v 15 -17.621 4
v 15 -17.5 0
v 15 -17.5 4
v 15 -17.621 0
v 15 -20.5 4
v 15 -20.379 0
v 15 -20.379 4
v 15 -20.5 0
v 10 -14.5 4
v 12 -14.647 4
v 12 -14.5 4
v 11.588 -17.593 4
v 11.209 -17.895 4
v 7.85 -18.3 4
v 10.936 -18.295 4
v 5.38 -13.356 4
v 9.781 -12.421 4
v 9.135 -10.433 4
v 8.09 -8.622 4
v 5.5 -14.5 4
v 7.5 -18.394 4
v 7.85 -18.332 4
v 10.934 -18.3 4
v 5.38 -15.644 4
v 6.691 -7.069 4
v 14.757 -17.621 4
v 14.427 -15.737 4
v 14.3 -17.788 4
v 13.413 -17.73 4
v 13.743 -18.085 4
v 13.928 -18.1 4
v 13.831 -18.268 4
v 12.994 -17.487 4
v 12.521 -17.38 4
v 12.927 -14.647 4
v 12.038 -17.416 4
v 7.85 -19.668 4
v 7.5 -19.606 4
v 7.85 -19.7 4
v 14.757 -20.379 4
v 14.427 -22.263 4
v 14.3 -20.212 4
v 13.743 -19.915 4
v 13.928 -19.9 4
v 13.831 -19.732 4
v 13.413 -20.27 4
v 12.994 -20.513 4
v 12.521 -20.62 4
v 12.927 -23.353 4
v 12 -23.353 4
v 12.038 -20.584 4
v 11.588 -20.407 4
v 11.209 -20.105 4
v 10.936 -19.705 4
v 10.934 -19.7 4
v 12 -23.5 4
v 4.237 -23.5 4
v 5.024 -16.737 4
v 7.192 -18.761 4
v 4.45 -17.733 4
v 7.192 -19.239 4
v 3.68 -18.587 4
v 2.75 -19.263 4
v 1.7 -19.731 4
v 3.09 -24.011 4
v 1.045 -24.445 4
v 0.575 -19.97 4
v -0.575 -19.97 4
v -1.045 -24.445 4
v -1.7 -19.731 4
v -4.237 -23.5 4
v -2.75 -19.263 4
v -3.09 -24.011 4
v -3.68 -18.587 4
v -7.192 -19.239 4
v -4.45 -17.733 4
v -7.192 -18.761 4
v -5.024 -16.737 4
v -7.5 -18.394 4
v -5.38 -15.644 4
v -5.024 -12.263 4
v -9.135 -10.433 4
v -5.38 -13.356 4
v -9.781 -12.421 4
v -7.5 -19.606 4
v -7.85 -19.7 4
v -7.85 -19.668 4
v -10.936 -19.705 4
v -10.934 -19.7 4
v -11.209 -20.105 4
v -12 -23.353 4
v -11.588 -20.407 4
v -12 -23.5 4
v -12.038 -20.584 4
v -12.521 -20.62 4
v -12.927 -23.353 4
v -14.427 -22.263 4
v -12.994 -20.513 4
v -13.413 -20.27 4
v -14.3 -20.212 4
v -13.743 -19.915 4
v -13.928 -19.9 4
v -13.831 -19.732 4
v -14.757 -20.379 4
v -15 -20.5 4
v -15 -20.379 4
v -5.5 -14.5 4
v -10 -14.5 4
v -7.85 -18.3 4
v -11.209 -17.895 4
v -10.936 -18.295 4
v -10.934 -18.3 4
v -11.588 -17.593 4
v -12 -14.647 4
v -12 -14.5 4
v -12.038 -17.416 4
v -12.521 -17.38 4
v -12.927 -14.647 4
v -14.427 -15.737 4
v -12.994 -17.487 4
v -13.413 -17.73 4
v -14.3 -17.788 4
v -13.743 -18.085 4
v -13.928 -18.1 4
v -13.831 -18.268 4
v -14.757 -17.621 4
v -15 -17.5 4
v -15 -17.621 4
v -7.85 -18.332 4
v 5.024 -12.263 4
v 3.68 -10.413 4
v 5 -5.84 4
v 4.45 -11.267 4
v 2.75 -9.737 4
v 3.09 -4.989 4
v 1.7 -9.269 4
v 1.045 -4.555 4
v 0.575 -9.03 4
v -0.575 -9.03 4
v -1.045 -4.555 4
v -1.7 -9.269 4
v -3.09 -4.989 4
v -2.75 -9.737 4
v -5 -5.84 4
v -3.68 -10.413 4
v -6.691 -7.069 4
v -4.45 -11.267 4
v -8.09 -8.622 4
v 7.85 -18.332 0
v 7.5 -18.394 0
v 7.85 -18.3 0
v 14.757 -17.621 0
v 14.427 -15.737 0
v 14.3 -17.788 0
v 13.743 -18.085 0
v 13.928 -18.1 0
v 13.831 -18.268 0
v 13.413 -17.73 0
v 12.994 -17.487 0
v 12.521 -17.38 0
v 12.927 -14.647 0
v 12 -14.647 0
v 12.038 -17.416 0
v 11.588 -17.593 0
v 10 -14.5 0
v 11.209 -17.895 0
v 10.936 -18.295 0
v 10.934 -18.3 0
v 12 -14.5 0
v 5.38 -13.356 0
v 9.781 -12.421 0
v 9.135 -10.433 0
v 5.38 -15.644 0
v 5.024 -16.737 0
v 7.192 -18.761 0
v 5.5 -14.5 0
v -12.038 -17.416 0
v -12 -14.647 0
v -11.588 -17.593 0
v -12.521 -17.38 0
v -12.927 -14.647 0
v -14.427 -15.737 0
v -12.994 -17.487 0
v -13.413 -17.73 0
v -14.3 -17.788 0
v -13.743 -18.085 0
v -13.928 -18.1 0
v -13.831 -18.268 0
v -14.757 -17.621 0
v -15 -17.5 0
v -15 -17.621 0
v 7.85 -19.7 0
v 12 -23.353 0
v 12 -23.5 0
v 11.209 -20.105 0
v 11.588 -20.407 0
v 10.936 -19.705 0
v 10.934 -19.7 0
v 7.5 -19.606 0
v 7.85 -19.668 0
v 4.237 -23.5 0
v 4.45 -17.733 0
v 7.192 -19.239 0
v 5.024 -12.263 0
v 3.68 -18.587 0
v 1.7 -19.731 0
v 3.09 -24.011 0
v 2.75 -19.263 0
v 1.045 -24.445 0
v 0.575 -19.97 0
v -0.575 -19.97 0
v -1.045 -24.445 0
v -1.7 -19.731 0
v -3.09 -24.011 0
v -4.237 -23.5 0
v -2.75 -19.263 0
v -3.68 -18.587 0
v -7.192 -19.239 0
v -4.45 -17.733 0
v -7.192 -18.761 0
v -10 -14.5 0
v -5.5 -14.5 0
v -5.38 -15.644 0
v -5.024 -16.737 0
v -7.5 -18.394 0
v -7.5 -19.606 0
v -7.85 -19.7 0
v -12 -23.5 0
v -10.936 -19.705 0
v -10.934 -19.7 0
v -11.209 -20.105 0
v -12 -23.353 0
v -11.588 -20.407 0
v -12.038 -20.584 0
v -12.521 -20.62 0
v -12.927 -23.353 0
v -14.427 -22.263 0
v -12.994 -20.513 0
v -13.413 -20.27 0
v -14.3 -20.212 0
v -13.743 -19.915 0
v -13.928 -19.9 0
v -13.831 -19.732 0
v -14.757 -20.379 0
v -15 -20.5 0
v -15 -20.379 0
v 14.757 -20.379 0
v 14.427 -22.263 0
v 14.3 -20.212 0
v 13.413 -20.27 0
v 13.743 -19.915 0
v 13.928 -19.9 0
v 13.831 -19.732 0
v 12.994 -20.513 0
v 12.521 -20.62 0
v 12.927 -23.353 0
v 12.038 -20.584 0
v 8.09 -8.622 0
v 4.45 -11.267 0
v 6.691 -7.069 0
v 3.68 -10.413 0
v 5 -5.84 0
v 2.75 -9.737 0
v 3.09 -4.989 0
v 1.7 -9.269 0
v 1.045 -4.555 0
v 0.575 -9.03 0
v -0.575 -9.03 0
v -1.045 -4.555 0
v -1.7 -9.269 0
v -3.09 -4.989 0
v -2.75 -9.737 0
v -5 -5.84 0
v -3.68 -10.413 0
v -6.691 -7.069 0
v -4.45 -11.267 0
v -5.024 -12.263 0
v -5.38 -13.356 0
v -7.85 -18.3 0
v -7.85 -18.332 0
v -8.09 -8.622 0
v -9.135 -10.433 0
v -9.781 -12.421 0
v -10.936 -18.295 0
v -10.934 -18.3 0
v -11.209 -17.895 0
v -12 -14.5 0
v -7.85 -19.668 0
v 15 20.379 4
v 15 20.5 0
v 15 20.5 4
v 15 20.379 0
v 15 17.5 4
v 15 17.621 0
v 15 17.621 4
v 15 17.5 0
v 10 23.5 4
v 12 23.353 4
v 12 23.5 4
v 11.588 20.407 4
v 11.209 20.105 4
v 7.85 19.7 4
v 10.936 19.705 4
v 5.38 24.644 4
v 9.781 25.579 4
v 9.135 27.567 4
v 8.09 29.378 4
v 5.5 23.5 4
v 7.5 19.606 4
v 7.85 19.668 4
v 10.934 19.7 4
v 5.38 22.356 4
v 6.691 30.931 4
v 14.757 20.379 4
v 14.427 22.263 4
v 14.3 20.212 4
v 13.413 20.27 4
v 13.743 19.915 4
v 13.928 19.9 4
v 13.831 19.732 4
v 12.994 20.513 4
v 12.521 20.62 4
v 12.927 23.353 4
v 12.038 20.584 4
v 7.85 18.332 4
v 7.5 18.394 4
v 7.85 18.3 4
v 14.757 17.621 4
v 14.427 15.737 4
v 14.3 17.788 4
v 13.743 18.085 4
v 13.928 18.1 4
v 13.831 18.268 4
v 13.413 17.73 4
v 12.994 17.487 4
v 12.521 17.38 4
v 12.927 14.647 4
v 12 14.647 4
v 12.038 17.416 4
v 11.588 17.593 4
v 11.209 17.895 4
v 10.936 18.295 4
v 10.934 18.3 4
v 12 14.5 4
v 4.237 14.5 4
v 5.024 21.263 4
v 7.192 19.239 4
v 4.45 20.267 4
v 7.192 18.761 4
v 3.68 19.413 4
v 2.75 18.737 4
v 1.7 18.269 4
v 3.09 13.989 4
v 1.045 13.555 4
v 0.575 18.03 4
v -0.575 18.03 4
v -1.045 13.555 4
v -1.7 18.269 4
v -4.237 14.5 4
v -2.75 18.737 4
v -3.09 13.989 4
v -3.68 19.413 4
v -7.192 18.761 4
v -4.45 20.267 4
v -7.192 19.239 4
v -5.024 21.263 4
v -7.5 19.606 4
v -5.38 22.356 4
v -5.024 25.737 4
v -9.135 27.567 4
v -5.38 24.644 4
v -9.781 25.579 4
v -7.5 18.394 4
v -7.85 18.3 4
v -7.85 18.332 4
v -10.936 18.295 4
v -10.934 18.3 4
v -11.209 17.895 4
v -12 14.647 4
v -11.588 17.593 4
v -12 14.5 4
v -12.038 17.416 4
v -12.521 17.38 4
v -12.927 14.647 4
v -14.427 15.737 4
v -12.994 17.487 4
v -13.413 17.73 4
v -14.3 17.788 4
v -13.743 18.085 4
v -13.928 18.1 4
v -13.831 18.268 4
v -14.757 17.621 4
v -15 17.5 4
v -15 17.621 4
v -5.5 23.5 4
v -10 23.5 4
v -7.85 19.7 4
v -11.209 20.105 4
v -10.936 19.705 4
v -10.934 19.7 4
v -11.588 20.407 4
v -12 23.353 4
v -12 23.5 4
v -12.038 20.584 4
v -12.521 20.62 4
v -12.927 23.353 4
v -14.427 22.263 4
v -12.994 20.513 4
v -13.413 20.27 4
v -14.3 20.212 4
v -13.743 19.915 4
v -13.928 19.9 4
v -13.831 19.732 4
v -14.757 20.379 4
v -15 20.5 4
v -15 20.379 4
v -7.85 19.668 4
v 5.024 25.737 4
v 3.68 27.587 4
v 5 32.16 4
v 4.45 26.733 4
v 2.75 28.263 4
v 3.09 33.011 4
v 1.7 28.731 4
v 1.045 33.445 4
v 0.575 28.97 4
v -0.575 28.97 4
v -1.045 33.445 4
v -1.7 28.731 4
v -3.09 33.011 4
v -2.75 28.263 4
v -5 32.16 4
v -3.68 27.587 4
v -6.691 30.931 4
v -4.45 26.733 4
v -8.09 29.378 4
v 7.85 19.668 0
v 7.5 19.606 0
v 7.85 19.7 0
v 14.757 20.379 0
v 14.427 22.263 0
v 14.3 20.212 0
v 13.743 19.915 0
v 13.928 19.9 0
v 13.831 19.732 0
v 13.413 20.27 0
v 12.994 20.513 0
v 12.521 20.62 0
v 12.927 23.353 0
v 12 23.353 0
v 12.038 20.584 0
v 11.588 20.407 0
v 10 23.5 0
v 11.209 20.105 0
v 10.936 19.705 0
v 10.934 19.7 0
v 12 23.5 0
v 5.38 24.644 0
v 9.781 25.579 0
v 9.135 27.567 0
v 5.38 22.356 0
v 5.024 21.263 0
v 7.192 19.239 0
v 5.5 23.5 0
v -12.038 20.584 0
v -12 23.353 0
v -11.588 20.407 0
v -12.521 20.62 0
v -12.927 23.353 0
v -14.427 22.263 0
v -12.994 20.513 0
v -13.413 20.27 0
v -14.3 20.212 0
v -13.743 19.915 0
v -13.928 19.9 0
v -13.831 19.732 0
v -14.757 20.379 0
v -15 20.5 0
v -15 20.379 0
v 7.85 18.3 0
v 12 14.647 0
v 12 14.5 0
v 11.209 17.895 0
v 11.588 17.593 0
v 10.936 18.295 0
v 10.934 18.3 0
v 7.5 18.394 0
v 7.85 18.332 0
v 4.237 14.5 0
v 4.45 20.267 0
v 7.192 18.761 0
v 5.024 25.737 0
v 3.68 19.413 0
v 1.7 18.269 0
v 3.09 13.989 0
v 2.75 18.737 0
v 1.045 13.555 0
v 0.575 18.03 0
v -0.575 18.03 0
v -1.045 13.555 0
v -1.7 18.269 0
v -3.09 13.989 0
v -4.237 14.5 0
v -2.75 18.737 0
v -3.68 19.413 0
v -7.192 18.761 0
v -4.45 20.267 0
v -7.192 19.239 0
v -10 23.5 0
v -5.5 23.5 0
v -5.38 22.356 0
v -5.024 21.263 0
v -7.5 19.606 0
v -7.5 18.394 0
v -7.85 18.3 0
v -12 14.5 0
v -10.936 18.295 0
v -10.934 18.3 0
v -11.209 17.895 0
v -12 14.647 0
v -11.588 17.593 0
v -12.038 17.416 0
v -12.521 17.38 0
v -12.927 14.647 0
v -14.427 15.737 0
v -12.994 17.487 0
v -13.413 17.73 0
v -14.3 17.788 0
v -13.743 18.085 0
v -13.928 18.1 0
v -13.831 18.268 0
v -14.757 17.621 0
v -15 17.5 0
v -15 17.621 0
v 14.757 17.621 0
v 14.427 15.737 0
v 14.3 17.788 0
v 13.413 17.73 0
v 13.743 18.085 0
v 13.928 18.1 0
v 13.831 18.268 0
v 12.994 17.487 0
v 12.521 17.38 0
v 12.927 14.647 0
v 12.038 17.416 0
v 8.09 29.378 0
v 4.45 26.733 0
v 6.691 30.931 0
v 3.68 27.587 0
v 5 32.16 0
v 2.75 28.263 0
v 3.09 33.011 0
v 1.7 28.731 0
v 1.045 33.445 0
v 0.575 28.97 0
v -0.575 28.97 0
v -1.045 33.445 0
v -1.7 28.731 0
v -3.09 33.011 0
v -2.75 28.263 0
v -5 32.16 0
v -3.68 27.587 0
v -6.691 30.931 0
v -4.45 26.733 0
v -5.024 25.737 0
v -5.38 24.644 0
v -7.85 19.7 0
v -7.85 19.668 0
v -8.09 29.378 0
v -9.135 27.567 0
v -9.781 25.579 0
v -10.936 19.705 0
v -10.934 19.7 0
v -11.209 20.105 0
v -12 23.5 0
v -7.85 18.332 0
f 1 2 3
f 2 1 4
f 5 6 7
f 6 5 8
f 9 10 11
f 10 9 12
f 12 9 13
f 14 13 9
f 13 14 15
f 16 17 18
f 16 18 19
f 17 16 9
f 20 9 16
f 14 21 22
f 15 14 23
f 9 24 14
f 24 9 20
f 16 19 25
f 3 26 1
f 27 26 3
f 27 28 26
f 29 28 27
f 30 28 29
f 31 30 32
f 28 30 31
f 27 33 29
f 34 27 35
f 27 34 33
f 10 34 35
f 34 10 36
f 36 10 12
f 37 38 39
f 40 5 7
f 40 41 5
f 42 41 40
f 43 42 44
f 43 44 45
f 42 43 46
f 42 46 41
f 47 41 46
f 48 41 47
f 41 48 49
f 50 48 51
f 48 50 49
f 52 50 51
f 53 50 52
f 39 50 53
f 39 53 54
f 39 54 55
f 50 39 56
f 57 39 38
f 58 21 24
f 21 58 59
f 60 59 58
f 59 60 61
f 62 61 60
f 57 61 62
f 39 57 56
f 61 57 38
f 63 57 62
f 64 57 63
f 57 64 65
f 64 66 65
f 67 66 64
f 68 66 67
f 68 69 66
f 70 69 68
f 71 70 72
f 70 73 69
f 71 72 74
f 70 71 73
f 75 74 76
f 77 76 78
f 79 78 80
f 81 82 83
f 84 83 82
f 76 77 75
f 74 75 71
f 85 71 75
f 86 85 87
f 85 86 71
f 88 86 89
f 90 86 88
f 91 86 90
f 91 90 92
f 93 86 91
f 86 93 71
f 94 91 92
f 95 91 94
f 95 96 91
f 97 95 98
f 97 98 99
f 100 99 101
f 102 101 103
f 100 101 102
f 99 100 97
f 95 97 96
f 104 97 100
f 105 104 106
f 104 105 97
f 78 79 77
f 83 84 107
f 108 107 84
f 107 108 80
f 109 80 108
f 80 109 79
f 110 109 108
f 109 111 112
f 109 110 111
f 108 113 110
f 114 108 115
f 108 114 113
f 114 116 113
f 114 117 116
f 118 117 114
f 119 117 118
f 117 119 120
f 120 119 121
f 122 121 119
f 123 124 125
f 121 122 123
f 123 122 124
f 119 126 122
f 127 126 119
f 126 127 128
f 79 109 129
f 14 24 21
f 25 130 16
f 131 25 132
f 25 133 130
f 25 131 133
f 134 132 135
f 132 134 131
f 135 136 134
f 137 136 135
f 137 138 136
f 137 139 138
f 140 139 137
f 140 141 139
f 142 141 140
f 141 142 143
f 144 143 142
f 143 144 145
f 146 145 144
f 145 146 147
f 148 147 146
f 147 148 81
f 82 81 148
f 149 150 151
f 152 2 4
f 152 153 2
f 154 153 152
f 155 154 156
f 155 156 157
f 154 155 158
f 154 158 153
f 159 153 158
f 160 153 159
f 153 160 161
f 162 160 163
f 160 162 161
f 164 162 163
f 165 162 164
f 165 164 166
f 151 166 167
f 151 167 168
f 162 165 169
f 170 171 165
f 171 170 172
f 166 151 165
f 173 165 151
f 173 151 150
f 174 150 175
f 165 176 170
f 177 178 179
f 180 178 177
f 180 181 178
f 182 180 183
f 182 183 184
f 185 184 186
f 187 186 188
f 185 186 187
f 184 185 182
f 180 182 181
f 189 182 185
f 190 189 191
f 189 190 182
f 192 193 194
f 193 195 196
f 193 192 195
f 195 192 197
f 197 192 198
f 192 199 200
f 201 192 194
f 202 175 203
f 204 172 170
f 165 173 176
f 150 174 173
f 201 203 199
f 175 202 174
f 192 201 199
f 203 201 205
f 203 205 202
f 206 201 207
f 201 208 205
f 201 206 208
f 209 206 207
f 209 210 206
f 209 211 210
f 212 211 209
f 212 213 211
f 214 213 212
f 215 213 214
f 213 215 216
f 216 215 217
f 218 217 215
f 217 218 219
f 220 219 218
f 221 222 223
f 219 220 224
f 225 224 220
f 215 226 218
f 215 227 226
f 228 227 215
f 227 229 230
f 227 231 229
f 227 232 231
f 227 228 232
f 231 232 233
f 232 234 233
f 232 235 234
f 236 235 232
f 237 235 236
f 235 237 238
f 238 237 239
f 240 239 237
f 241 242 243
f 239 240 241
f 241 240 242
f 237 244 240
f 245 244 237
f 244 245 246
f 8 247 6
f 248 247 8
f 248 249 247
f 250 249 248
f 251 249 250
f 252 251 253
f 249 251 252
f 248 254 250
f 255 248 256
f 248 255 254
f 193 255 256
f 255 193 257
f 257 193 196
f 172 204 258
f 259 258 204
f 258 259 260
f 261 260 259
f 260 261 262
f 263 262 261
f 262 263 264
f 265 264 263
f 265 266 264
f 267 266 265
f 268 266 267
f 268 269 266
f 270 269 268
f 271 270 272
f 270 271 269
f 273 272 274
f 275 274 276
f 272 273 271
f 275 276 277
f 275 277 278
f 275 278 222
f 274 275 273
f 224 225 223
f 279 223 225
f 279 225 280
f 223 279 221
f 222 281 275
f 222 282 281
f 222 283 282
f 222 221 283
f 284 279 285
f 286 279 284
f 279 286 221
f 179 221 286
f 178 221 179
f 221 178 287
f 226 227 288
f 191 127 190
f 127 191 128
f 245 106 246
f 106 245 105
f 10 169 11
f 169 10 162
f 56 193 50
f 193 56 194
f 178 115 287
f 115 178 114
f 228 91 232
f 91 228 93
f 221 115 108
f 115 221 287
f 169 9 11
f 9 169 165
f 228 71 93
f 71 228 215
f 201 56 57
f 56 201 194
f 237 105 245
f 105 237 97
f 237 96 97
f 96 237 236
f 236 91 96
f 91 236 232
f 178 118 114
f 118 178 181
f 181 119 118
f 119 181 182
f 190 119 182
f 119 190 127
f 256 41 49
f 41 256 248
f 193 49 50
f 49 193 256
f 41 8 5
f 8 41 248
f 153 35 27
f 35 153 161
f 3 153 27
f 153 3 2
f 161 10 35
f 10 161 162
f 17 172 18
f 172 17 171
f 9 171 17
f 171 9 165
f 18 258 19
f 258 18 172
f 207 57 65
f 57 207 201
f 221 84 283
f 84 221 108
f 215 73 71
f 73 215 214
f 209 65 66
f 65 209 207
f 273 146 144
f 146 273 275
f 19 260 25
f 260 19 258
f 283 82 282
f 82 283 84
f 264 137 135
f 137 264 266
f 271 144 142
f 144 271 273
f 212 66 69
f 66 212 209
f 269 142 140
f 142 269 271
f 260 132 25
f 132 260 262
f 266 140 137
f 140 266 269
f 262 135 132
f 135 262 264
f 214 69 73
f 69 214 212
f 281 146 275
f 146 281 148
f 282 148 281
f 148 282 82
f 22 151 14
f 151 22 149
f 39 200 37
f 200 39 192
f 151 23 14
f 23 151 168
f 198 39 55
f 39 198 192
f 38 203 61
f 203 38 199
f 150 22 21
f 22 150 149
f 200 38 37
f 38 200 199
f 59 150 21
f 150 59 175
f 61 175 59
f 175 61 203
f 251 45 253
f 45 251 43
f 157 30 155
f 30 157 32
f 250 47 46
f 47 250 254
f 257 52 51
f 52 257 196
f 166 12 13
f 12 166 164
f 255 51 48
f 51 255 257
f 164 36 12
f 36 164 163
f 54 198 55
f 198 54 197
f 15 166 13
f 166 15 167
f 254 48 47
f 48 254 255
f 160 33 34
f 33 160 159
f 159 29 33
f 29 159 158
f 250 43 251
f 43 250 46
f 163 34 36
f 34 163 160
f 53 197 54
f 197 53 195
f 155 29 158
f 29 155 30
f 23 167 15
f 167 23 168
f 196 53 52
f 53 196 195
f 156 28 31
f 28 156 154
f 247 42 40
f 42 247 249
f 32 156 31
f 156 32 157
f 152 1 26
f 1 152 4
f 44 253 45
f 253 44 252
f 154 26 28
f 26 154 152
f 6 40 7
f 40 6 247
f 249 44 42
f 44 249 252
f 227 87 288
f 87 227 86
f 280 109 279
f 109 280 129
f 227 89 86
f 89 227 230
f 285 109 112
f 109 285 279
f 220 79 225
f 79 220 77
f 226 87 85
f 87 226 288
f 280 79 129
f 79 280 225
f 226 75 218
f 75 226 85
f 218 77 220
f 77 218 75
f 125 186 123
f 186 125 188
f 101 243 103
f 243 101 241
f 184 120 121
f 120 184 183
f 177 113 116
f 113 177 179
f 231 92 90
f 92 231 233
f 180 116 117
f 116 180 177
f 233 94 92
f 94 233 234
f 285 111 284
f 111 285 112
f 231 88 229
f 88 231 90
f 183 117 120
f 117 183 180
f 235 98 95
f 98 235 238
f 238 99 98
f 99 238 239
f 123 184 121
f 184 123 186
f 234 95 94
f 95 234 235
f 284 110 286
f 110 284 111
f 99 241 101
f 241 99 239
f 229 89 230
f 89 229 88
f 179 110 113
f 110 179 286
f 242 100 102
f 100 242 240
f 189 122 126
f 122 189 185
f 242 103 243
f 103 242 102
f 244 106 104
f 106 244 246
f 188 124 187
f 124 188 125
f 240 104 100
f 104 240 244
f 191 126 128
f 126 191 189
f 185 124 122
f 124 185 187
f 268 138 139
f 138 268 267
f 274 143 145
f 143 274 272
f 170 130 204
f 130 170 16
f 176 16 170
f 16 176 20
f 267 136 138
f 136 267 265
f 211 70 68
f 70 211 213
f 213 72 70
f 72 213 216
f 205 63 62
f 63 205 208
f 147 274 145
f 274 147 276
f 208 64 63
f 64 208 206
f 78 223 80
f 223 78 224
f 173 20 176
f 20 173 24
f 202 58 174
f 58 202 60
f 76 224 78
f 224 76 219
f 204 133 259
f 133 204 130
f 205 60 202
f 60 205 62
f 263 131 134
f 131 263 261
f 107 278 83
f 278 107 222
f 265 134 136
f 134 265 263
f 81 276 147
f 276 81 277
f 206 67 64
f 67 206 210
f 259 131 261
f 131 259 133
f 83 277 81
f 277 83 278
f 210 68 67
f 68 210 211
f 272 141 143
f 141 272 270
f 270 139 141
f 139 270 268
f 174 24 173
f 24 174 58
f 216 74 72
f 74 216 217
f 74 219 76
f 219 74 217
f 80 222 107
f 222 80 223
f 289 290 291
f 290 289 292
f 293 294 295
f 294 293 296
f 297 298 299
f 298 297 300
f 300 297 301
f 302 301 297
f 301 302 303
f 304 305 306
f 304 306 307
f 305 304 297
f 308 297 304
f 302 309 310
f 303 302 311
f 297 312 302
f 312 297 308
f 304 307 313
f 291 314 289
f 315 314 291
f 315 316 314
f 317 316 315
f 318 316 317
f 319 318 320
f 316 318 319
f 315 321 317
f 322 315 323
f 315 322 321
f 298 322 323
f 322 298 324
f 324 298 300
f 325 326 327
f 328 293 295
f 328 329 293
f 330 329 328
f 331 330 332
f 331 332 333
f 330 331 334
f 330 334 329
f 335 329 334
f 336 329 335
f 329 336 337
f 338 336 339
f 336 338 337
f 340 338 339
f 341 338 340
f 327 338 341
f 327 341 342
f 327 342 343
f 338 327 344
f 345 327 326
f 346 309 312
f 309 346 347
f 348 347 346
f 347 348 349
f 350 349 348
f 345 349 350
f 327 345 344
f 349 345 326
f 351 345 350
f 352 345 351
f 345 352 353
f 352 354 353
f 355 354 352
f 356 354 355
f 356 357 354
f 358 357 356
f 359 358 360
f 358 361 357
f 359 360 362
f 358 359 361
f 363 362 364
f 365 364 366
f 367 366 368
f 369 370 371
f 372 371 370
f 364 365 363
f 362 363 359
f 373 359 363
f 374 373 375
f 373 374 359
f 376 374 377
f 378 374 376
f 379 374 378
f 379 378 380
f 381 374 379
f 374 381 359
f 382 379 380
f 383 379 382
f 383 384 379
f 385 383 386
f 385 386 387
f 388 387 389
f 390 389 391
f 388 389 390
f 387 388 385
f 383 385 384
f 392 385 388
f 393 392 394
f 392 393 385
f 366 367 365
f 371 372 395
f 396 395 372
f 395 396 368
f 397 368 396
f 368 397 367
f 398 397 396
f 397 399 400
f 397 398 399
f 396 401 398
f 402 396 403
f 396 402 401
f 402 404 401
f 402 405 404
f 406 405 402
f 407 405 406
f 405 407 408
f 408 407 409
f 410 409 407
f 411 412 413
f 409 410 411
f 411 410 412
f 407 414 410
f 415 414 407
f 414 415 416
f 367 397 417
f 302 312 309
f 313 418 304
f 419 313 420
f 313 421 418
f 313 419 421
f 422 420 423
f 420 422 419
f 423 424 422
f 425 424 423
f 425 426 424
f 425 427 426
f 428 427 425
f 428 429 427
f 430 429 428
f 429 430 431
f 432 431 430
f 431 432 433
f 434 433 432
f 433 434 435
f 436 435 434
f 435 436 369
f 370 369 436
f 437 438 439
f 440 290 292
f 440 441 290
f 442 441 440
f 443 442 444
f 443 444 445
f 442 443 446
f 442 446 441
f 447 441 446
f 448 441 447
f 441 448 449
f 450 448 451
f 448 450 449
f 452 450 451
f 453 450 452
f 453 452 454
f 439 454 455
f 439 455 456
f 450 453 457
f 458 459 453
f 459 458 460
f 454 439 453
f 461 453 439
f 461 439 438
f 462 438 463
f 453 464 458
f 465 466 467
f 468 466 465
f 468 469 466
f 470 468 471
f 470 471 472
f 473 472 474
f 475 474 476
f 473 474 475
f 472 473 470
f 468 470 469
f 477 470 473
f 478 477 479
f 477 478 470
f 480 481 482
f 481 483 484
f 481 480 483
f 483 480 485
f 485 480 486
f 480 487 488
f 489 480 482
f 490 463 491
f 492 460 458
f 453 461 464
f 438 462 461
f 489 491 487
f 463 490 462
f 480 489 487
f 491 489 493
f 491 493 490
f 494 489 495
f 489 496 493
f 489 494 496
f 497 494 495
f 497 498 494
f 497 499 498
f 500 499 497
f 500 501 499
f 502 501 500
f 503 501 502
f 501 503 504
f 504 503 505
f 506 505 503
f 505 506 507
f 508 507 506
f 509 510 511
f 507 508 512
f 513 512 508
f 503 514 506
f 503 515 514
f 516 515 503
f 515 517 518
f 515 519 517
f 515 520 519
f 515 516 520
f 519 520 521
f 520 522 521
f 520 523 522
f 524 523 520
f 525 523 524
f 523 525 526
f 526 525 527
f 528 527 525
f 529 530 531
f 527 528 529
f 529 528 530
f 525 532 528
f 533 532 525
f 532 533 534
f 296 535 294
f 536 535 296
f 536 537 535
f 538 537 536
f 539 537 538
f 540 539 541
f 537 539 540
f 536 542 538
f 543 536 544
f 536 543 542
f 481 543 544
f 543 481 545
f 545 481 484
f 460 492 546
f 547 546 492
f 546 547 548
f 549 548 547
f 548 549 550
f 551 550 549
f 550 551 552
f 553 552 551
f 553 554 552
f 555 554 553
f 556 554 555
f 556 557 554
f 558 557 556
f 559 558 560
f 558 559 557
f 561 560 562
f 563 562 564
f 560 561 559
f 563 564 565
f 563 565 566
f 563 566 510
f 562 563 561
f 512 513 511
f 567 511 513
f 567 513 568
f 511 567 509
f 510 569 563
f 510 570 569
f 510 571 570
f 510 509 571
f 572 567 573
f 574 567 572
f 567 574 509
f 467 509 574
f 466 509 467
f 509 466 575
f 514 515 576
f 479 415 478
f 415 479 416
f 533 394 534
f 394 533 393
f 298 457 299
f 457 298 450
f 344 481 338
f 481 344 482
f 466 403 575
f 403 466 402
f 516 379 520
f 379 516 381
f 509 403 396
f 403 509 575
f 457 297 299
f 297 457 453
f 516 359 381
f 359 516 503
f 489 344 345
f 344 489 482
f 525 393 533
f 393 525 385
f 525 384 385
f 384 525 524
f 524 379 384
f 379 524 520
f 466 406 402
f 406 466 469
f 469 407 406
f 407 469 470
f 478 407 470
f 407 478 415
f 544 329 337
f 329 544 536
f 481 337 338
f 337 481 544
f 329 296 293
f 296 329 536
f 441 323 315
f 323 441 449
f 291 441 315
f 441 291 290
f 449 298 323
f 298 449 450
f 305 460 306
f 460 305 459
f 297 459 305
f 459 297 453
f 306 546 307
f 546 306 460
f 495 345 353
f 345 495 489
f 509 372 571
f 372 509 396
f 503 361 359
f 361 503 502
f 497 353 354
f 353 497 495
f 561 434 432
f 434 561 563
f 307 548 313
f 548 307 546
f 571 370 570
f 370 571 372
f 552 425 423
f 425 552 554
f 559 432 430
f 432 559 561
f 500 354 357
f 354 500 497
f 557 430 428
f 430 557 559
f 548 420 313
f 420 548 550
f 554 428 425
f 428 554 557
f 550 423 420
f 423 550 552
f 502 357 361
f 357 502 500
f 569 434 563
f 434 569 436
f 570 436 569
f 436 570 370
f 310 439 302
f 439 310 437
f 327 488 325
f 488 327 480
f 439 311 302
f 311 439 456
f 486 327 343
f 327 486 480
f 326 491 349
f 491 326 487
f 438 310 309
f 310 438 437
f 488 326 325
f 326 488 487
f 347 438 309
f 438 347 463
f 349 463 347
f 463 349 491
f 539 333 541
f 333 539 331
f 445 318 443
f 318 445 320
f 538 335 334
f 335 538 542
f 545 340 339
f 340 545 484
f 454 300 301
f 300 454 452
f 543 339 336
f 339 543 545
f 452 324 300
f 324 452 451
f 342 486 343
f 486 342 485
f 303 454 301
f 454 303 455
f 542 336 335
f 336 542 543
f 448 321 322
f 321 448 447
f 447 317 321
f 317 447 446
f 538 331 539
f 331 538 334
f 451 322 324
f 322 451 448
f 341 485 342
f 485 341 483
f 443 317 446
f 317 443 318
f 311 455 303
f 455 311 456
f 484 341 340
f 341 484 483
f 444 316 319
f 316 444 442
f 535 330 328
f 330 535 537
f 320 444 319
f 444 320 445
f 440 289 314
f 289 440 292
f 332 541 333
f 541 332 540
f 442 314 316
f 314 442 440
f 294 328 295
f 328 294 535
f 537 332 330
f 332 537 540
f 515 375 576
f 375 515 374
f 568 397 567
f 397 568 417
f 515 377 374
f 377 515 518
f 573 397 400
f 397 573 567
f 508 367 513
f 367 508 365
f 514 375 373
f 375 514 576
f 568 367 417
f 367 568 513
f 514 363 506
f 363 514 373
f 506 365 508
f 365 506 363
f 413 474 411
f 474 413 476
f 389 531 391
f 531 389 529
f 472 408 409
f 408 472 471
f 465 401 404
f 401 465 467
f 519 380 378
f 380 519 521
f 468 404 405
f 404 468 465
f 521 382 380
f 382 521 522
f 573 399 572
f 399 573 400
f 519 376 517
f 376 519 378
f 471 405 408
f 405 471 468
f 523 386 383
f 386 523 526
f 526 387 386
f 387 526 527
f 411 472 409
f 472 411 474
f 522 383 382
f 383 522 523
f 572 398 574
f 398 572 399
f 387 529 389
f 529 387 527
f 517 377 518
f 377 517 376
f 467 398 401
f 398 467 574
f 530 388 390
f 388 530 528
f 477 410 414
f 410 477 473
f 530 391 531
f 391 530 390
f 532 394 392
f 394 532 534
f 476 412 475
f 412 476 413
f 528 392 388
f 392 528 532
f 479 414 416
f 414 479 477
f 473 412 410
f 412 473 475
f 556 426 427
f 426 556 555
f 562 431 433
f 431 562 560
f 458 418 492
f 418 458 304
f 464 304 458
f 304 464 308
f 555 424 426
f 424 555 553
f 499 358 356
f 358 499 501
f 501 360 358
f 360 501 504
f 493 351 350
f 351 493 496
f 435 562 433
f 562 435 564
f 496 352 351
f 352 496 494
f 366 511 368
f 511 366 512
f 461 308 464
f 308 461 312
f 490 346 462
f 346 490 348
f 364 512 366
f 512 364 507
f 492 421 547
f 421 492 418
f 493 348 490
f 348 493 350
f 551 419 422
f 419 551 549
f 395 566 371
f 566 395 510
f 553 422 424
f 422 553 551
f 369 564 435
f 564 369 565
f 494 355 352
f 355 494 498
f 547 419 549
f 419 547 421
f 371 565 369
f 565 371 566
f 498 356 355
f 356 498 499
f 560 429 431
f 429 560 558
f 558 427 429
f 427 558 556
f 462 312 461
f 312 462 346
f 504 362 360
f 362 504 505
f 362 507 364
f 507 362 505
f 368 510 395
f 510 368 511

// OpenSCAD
// Filament clip

ol = 30;     // Overall length
ow = 9;     // Overall width
oh = 4;      // Overall height
cr = 3;      // Corner radius
d1 = 3.25;   // Diameter of filament
d2 = 2.8;    // Diameter of clip entry
d3 = 20;     // Diameter of finger grip
d4 = 11;     // Diamater of finger grip hole

module RoundedRectPlate(l, w, h, r)
{
    translate([0,0,h/2])
    {
        cube(size=[l,w-2*r,h], center=true);
        cube(size=[l-2*r,w,h], center=true);
    }
    for (dx = [-(l/2-r),(l/2-r)])
    {
        for (dy = [-(w/2-r),(w/2-r)])
        {
            translate([dx,dy,0]) cylinder(r=r, h=h);
        }
    }
}

module CutoutHole(x,y,r,h)
{
    delta = 0.5;
    translate([x,y,-delta]) cylinder(r=r,h=h+2*delta,$fs=0.5);
}

module CutoutCube(x,y,dx,dy,h)
{
    delta = 0.5;
    translate([x,y,h/2]) cube(size=[dx,dy,h+2*delta], center=true);
}

module CutoutSlot(x,y,dx,dy,h)
{
    delta = 0.5;
    translate([x,y,h/2])   cube(size=[dx,dy,h+2*delta], center=true);
    translate([x-dx/2,y,-delta]) cylinder(r=dy/2,h=h+2*delta,$fs=0.5);
    translate([x+dx/2,y,-delta]) cylinder(r=dy/2,h=h+2*delta,$fs=0.5);
}

// dir: 0: +x
//      1: +y
//      2: -x
//      3: -y
module FilamentJaw(pos,dir,fd,fe,h)
{
    translate(pos)
    {
        rotate([0,0,dir*90])
        {
            CutoutHole(-fd*0.8, 0, fd/2, h);
            CutoutHole(    0  , 0, fe/2, h);
            CutoutSlot(-fd*1.7, 0, fd, fe/2, h);
        }
    }
}

module FilamentClip()
{
    difference()
    {
        union()
        {
            RoundedRectPlate(ol, ow, oh, cr );
            translate([0,ow/2,0]) cylinder(r=d3/2, h=oh);
        }
        CutoutHole(0, ow/2, d4/2, oh);
        FilamentJaw([ ol/2,0,0], 0, d1, d2, oh);
        FilamentJaw([-ol/2,0,0], 2, d1, d2, oh);
        //FilamentJaw([ ol/4,-ow/2,0],3,d1,d2,oh);
        //FilamentJaw([-ol/4,-ow/2,0],3,d1,d2,oh);
    }
}

yd = ow+d3/2;
for (yo = [-yd,yd])
{
    translate([0,yo,0]) FilamentClip();
}
